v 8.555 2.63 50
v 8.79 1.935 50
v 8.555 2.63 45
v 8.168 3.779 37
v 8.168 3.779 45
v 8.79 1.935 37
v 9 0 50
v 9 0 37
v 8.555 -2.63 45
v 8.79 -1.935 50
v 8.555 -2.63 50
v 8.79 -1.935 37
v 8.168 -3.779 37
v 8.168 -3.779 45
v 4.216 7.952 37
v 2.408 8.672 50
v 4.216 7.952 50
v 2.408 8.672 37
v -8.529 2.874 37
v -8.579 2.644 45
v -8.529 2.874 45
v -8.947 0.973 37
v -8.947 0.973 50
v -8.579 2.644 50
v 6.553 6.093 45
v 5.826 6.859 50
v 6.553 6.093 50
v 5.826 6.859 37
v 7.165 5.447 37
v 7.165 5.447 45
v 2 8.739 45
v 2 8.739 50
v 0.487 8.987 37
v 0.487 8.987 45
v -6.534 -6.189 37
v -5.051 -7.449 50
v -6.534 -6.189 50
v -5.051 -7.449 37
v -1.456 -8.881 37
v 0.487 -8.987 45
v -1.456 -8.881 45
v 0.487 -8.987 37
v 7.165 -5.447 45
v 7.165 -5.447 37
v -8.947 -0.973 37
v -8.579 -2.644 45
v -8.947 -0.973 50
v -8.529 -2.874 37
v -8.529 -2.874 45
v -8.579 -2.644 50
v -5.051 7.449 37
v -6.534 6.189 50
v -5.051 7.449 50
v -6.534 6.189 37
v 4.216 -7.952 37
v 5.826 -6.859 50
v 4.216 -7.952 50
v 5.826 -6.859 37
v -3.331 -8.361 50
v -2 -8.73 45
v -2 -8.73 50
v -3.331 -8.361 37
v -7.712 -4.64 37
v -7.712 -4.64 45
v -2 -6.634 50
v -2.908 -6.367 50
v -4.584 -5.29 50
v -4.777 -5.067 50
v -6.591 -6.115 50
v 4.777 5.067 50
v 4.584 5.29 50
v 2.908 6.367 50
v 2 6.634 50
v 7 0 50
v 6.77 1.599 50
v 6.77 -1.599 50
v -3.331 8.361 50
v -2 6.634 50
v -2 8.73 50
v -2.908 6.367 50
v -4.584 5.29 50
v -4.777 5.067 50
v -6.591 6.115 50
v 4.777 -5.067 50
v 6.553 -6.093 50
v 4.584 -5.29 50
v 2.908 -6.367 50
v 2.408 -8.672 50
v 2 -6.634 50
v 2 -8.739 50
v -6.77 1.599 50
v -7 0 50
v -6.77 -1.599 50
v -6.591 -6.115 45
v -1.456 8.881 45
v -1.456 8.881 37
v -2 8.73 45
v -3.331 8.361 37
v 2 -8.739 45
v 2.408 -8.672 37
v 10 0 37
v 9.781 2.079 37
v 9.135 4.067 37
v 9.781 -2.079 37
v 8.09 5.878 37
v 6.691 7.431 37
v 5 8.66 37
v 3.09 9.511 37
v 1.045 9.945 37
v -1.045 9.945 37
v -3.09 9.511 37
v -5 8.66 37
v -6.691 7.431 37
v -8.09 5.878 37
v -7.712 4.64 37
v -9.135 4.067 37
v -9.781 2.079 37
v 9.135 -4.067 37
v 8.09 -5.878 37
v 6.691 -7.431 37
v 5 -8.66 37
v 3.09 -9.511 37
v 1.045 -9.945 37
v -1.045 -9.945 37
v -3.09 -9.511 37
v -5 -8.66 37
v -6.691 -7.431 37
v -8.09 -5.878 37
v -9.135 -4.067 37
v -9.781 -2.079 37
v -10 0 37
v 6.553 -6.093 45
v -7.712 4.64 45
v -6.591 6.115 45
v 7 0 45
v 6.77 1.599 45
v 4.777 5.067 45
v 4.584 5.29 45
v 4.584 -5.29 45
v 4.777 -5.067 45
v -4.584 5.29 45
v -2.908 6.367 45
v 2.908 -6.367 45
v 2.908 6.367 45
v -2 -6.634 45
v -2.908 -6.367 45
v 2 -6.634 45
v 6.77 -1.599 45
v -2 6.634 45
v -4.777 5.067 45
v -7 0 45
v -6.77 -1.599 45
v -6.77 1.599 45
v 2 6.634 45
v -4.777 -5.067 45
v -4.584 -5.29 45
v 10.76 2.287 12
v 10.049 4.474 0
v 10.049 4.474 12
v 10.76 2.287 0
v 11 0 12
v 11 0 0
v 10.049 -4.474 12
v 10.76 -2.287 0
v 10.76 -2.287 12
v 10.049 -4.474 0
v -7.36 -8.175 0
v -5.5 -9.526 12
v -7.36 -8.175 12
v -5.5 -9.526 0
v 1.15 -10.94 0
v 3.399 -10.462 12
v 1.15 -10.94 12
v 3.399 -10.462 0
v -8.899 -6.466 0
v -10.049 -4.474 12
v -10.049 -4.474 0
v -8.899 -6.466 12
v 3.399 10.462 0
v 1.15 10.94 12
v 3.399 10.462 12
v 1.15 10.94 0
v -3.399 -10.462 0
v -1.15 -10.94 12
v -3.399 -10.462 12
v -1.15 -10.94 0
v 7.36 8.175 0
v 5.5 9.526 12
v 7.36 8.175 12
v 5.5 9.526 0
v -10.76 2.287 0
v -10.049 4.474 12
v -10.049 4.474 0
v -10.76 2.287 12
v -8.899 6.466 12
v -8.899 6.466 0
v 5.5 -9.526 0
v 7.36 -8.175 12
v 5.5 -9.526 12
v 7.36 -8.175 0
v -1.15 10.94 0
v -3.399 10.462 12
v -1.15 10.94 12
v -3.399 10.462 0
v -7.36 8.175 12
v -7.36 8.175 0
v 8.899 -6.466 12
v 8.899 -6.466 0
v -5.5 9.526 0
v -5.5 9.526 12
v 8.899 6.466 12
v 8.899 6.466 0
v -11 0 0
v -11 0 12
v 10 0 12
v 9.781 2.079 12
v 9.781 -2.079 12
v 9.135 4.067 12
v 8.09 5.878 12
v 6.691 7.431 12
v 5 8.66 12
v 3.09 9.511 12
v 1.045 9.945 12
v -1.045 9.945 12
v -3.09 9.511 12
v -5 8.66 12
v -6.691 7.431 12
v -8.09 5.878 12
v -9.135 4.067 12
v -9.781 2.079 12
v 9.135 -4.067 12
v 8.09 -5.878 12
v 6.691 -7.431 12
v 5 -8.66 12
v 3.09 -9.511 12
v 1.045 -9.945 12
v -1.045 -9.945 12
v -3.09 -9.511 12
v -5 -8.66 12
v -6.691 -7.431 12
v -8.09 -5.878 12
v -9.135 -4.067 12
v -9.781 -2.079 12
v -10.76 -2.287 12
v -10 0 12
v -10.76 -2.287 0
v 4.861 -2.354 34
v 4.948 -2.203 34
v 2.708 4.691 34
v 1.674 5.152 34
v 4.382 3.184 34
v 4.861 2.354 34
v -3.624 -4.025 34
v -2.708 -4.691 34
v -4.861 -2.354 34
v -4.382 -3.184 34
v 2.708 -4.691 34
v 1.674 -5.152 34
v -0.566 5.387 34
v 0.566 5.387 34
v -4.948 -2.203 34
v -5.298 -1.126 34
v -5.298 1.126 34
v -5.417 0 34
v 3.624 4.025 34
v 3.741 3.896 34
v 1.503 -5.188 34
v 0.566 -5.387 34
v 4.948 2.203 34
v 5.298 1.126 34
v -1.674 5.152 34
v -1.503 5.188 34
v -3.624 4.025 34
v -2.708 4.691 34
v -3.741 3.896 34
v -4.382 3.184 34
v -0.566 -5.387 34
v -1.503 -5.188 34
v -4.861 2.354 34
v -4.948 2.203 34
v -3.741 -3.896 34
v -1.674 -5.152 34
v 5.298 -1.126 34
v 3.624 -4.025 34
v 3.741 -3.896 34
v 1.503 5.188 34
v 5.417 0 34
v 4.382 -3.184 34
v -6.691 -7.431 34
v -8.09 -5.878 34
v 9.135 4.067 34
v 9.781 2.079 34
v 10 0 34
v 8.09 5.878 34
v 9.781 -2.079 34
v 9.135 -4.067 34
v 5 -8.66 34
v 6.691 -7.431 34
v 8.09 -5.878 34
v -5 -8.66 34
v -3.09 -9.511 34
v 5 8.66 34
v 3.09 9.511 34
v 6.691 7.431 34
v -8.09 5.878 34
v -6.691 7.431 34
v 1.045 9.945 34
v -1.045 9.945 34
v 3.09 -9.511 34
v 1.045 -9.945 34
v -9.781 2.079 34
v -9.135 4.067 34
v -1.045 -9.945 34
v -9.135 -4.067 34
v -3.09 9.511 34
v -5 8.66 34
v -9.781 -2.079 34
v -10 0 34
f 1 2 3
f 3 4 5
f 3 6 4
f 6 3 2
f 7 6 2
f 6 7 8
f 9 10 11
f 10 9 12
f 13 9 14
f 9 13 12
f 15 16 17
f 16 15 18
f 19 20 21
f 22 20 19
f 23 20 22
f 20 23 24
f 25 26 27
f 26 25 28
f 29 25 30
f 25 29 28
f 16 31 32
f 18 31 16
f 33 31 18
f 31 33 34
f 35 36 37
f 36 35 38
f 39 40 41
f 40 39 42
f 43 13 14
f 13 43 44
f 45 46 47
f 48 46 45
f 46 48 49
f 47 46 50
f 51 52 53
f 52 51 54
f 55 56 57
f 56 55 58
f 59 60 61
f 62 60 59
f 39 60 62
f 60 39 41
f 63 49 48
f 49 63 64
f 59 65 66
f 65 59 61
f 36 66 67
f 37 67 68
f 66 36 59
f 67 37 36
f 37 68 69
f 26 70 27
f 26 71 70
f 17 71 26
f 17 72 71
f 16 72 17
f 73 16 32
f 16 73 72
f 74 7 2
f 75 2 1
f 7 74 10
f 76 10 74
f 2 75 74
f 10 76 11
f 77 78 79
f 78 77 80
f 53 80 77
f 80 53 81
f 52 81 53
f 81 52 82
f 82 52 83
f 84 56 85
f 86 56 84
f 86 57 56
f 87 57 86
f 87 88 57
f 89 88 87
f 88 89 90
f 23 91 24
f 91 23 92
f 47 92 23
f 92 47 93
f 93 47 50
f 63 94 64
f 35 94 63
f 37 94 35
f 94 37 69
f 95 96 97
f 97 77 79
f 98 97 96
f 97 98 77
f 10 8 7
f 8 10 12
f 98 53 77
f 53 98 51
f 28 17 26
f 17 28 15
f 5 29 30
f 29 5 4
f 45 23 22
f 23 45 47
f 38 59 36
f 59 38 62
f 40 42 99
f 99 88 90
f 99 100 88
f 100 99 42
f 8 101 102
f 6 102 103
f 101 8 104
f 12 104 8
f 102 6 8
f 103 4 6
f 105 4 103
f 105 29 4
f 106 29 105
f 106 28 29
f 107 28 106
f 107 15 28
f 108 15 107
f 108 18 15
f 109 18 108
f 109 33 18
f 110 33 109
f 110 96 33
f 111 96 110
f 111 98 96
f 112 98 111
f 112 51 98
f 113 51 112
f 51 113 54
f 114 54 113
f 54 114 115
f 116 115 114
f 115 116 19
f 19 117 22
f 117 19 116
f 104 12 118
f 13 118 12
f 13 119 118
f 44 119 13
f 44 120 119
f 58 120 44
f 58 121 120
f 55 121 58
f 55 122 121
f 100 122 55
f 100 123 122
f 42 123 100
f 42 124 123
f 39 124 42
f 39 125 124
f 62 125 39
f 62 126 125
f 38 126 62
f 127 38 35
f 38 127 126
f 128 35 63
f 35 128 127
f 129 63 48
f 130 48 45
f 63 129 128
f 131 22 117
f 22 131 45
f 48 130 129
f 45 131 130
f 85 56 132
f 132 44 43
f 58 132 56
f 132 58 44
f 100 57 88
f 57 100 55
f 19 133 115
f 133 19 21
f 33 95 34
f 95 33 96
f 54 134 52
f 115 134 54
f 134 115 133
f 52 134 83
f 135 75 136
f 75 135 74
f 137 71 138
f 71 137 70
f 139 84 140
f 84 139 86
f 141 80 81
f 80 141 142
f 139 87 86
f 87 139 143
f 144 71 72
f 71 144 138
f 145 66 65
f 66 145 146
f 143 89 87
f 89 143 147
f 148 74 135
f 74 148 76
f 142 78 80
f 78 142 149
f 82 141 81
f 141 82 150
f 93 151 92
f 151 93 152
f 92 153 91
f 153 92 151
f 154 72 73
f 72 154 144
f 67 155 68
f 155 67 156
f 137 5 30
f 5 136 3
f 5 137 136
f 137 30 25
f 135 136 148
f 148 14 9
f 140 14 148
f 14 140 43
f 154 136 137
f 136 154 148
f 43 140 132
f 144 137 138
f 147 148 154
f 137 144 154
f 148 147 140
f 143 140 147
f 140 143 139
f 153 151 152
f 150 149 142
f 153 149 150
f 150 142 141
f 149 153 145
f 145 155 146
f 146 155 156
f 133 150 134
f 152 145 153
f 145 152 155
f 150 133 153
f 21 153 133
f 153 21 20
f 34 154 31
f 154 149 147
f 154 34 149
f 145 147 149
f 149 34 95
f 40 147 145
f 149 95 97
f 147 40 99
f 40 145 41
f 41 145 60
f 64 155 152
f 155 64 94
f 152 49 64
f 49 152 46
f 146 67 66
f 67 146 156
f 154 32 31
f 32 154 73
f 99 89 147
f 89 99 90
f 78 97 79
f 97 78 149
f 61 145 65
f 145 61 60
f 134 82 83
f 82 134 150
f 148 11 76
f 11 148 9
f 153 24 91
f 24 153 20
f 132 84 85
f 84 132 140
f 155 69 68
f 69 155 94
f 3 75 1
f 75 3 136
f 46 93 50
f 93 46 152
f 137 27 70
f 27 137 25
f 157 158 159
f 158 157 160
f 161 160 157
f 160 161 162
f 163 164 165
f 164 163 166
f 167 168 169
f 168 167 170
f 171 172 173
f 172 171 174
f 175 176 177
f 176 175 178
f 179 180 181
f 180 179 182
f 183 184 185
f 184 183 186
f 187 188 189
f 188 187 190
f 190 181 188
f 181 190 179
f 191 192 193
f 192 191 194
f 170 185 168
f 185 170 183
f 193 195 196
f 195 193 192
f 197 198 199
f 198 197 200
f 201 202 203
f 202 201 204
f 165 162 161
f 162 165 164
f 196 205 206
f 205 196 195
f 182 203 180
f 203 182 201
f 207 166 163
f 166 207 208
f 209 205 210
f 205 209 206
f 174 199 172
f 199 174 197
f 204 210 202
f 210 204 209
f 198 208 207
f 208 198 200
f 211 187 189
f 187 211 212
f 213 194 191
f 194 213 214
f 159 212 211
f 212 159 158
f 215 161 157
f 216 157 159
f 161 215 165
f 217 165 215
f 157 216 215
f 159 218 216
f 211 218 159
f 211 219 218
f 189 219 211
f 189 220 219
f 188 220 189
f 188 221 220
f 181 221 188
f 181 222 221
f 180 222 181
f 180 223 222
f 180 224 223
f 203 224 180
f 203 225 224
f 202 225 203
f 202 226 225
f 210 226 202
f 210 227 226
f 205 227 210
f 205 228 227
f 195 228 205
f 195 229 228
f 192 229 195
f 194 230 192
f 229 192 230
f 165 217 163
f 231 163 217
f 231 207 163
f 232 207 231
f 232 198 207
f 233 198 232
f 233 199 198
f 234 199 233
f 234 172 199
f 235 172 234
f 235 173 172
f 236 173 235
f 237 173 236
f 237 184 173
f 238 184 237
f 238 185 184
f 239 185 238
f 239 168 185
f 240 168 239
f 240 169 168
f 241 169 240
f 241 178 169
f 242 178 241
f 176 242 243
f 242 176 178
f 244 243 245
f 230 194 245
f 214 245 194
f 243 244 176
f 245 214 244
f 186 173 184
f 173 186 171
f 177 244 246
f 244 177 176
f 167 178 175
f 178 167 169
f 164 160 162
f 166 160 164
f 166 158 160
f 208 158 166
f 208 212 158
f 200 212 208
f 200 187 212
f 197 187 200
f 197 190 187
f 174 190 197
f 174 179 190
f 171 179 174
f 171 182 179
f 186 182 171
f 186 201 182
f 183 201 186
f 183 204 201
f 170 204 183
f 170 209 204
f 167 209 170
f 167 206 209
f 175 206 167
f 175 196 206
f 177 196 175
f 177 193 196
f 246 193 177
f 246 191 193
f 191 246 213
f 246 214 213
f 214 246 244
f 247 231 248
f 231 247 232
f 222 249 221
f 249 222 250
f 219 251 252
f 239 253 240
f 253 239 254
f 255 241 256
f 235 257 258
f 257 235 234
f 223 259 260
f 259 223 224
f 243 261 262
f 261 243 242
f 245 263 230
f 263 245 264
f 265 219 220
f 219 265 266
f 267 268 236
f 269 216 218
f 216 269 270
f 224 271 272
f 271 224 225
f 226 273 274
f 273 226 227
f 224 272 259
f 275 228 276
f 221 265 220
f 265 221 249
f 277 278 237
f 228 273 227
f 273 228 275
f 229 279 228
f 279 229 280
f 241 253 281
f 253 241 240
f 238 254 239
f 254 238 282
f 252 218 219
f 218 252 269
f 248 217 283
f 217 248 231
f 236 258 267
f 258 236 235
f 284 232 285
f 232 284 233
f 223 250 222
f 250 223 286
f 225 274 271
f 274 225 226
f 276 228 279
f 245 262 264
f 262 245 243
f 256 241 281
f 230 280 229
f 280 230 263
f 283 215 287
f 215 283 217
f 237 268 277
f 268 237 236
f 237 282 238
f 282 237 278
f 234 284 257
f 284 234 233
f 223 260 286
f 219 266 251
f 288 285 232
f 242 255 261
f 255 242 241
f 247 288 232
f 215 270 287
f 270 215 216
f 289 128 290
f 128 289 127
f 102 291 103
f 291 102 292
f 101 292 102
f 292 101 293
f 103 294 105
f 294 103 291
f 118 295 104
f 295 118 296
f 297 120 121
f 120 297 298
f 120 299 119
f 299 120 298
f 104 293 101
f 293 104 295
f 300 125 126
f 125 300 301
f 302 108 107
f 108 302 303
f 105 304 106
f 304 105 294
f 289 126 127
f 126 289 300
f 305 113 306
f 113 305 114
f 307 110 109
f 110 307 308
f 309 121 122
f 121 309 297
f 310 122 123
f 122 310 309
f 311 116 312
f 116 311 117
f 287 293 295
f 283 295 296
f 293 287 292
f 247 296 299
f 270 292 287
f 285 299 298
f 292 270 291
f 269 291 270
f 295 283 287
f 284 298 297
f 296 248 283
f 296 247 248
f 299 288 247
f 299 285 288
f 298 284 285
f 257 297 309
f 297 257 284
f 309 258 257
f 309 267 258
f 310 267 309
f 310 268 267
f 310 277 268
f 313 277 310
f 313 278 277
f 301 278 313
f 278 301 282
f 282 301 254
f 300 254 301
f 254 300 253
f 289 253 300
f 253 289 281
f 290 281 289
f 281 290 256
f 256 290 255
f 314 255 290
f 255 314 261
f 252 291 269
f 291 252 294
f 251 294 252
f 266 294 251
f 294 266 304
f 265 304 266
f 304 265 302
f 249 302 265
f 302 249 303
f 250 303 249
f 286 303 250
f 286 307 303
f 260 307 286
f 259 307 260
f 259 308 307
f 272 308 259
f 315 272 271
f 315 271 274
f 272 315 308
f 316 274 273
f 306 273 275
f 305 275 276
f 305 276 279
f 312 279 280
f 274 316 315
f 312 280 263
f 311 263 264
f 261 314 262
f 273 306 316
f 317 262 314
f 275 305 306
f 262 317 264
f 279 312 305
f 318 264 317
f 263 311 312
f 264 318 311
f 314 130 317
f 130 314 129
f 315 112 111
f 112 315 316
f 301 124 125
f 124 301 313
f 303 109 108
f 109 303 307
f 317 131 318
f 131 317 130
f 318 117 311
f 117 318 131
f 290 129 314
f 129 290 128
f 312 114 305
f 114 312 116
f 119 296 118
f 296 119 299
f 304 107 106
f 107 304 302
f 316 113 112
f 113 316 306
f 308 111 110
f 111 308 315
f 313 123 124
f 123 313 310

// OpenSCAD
// Generated by SolidPython 1.1.1 on 2021-11-02 02:15:39


union() {
	cylinder(d = 22, h = 12);
	translate(v = [0, 0, 12]) {
		cylinder(d1 = 20, d2 = 10, h = 24);
	}
	translate(v = [0, 0, 34]) {
		cylinder(d = 20, h = 3);
	}
	translate(v = [0, 0, 37]) {
		difference() {
			cylinder(d = 18, h = 13);
			translate(v = [0, 0, 8]) {
				cylinder(d = 14, h = 6);
			}
			translate(v = [0, 0, 11]) {
				rotate(a = [0, 0, 0]) {
					cube(center = true, size = [4, 19, 6]);
				}
			}
			translate(v = [0, 0, 11]) {
				rotate(a = [0, 0, 60]) {
					cube(center = true, size = [4, 19, 6]);
				}
			}
			translate(v = [0, 0, 11]) {
				rotate(a = [0, 0, 120]) {
					cube(center = true, size = [4, 19, 6]);
				}
			}
		}
	}
}
/***********************************************
*********      SolidPython code:      **********
************************************************
 
from solid import *
from solid.utils import *

#total height 5cm

def alternative():
    head = difference() (
        cylinder(d=18, h=13),
        up(8)(cylinder(d=14, h=6))
    )
    # alternative way to create upper part of rook with lists
    crown = union() (
        *(up(11)(rotate([0,0,a])(cube([4,19,6], center=True))) for a in [0, 60, 120])
    )
    head -= crown
    r = union() (base,
        up(12)(body),
        up(34)(colar),
        up(37)(head)
    )

    return r

base = cylinder(d=22, h=12)
body = cylinder(d1=20, d2=10, h=24)
collar = cylinder(d=20, h=3)
head = cylinder(d=18, h=13)
head -= up(8)(cylinder(d=14, h=6))

for a in [0, 60, 120]:
    head -= up(11)(rotate([0,0,a])(cube([4,19,6], center=True)))

rook = base + up(12)(body) + up(34)(collar) + up(37)(head)

scad_render_to_file(rook, "./rook.scad") 
 
************************************************/
